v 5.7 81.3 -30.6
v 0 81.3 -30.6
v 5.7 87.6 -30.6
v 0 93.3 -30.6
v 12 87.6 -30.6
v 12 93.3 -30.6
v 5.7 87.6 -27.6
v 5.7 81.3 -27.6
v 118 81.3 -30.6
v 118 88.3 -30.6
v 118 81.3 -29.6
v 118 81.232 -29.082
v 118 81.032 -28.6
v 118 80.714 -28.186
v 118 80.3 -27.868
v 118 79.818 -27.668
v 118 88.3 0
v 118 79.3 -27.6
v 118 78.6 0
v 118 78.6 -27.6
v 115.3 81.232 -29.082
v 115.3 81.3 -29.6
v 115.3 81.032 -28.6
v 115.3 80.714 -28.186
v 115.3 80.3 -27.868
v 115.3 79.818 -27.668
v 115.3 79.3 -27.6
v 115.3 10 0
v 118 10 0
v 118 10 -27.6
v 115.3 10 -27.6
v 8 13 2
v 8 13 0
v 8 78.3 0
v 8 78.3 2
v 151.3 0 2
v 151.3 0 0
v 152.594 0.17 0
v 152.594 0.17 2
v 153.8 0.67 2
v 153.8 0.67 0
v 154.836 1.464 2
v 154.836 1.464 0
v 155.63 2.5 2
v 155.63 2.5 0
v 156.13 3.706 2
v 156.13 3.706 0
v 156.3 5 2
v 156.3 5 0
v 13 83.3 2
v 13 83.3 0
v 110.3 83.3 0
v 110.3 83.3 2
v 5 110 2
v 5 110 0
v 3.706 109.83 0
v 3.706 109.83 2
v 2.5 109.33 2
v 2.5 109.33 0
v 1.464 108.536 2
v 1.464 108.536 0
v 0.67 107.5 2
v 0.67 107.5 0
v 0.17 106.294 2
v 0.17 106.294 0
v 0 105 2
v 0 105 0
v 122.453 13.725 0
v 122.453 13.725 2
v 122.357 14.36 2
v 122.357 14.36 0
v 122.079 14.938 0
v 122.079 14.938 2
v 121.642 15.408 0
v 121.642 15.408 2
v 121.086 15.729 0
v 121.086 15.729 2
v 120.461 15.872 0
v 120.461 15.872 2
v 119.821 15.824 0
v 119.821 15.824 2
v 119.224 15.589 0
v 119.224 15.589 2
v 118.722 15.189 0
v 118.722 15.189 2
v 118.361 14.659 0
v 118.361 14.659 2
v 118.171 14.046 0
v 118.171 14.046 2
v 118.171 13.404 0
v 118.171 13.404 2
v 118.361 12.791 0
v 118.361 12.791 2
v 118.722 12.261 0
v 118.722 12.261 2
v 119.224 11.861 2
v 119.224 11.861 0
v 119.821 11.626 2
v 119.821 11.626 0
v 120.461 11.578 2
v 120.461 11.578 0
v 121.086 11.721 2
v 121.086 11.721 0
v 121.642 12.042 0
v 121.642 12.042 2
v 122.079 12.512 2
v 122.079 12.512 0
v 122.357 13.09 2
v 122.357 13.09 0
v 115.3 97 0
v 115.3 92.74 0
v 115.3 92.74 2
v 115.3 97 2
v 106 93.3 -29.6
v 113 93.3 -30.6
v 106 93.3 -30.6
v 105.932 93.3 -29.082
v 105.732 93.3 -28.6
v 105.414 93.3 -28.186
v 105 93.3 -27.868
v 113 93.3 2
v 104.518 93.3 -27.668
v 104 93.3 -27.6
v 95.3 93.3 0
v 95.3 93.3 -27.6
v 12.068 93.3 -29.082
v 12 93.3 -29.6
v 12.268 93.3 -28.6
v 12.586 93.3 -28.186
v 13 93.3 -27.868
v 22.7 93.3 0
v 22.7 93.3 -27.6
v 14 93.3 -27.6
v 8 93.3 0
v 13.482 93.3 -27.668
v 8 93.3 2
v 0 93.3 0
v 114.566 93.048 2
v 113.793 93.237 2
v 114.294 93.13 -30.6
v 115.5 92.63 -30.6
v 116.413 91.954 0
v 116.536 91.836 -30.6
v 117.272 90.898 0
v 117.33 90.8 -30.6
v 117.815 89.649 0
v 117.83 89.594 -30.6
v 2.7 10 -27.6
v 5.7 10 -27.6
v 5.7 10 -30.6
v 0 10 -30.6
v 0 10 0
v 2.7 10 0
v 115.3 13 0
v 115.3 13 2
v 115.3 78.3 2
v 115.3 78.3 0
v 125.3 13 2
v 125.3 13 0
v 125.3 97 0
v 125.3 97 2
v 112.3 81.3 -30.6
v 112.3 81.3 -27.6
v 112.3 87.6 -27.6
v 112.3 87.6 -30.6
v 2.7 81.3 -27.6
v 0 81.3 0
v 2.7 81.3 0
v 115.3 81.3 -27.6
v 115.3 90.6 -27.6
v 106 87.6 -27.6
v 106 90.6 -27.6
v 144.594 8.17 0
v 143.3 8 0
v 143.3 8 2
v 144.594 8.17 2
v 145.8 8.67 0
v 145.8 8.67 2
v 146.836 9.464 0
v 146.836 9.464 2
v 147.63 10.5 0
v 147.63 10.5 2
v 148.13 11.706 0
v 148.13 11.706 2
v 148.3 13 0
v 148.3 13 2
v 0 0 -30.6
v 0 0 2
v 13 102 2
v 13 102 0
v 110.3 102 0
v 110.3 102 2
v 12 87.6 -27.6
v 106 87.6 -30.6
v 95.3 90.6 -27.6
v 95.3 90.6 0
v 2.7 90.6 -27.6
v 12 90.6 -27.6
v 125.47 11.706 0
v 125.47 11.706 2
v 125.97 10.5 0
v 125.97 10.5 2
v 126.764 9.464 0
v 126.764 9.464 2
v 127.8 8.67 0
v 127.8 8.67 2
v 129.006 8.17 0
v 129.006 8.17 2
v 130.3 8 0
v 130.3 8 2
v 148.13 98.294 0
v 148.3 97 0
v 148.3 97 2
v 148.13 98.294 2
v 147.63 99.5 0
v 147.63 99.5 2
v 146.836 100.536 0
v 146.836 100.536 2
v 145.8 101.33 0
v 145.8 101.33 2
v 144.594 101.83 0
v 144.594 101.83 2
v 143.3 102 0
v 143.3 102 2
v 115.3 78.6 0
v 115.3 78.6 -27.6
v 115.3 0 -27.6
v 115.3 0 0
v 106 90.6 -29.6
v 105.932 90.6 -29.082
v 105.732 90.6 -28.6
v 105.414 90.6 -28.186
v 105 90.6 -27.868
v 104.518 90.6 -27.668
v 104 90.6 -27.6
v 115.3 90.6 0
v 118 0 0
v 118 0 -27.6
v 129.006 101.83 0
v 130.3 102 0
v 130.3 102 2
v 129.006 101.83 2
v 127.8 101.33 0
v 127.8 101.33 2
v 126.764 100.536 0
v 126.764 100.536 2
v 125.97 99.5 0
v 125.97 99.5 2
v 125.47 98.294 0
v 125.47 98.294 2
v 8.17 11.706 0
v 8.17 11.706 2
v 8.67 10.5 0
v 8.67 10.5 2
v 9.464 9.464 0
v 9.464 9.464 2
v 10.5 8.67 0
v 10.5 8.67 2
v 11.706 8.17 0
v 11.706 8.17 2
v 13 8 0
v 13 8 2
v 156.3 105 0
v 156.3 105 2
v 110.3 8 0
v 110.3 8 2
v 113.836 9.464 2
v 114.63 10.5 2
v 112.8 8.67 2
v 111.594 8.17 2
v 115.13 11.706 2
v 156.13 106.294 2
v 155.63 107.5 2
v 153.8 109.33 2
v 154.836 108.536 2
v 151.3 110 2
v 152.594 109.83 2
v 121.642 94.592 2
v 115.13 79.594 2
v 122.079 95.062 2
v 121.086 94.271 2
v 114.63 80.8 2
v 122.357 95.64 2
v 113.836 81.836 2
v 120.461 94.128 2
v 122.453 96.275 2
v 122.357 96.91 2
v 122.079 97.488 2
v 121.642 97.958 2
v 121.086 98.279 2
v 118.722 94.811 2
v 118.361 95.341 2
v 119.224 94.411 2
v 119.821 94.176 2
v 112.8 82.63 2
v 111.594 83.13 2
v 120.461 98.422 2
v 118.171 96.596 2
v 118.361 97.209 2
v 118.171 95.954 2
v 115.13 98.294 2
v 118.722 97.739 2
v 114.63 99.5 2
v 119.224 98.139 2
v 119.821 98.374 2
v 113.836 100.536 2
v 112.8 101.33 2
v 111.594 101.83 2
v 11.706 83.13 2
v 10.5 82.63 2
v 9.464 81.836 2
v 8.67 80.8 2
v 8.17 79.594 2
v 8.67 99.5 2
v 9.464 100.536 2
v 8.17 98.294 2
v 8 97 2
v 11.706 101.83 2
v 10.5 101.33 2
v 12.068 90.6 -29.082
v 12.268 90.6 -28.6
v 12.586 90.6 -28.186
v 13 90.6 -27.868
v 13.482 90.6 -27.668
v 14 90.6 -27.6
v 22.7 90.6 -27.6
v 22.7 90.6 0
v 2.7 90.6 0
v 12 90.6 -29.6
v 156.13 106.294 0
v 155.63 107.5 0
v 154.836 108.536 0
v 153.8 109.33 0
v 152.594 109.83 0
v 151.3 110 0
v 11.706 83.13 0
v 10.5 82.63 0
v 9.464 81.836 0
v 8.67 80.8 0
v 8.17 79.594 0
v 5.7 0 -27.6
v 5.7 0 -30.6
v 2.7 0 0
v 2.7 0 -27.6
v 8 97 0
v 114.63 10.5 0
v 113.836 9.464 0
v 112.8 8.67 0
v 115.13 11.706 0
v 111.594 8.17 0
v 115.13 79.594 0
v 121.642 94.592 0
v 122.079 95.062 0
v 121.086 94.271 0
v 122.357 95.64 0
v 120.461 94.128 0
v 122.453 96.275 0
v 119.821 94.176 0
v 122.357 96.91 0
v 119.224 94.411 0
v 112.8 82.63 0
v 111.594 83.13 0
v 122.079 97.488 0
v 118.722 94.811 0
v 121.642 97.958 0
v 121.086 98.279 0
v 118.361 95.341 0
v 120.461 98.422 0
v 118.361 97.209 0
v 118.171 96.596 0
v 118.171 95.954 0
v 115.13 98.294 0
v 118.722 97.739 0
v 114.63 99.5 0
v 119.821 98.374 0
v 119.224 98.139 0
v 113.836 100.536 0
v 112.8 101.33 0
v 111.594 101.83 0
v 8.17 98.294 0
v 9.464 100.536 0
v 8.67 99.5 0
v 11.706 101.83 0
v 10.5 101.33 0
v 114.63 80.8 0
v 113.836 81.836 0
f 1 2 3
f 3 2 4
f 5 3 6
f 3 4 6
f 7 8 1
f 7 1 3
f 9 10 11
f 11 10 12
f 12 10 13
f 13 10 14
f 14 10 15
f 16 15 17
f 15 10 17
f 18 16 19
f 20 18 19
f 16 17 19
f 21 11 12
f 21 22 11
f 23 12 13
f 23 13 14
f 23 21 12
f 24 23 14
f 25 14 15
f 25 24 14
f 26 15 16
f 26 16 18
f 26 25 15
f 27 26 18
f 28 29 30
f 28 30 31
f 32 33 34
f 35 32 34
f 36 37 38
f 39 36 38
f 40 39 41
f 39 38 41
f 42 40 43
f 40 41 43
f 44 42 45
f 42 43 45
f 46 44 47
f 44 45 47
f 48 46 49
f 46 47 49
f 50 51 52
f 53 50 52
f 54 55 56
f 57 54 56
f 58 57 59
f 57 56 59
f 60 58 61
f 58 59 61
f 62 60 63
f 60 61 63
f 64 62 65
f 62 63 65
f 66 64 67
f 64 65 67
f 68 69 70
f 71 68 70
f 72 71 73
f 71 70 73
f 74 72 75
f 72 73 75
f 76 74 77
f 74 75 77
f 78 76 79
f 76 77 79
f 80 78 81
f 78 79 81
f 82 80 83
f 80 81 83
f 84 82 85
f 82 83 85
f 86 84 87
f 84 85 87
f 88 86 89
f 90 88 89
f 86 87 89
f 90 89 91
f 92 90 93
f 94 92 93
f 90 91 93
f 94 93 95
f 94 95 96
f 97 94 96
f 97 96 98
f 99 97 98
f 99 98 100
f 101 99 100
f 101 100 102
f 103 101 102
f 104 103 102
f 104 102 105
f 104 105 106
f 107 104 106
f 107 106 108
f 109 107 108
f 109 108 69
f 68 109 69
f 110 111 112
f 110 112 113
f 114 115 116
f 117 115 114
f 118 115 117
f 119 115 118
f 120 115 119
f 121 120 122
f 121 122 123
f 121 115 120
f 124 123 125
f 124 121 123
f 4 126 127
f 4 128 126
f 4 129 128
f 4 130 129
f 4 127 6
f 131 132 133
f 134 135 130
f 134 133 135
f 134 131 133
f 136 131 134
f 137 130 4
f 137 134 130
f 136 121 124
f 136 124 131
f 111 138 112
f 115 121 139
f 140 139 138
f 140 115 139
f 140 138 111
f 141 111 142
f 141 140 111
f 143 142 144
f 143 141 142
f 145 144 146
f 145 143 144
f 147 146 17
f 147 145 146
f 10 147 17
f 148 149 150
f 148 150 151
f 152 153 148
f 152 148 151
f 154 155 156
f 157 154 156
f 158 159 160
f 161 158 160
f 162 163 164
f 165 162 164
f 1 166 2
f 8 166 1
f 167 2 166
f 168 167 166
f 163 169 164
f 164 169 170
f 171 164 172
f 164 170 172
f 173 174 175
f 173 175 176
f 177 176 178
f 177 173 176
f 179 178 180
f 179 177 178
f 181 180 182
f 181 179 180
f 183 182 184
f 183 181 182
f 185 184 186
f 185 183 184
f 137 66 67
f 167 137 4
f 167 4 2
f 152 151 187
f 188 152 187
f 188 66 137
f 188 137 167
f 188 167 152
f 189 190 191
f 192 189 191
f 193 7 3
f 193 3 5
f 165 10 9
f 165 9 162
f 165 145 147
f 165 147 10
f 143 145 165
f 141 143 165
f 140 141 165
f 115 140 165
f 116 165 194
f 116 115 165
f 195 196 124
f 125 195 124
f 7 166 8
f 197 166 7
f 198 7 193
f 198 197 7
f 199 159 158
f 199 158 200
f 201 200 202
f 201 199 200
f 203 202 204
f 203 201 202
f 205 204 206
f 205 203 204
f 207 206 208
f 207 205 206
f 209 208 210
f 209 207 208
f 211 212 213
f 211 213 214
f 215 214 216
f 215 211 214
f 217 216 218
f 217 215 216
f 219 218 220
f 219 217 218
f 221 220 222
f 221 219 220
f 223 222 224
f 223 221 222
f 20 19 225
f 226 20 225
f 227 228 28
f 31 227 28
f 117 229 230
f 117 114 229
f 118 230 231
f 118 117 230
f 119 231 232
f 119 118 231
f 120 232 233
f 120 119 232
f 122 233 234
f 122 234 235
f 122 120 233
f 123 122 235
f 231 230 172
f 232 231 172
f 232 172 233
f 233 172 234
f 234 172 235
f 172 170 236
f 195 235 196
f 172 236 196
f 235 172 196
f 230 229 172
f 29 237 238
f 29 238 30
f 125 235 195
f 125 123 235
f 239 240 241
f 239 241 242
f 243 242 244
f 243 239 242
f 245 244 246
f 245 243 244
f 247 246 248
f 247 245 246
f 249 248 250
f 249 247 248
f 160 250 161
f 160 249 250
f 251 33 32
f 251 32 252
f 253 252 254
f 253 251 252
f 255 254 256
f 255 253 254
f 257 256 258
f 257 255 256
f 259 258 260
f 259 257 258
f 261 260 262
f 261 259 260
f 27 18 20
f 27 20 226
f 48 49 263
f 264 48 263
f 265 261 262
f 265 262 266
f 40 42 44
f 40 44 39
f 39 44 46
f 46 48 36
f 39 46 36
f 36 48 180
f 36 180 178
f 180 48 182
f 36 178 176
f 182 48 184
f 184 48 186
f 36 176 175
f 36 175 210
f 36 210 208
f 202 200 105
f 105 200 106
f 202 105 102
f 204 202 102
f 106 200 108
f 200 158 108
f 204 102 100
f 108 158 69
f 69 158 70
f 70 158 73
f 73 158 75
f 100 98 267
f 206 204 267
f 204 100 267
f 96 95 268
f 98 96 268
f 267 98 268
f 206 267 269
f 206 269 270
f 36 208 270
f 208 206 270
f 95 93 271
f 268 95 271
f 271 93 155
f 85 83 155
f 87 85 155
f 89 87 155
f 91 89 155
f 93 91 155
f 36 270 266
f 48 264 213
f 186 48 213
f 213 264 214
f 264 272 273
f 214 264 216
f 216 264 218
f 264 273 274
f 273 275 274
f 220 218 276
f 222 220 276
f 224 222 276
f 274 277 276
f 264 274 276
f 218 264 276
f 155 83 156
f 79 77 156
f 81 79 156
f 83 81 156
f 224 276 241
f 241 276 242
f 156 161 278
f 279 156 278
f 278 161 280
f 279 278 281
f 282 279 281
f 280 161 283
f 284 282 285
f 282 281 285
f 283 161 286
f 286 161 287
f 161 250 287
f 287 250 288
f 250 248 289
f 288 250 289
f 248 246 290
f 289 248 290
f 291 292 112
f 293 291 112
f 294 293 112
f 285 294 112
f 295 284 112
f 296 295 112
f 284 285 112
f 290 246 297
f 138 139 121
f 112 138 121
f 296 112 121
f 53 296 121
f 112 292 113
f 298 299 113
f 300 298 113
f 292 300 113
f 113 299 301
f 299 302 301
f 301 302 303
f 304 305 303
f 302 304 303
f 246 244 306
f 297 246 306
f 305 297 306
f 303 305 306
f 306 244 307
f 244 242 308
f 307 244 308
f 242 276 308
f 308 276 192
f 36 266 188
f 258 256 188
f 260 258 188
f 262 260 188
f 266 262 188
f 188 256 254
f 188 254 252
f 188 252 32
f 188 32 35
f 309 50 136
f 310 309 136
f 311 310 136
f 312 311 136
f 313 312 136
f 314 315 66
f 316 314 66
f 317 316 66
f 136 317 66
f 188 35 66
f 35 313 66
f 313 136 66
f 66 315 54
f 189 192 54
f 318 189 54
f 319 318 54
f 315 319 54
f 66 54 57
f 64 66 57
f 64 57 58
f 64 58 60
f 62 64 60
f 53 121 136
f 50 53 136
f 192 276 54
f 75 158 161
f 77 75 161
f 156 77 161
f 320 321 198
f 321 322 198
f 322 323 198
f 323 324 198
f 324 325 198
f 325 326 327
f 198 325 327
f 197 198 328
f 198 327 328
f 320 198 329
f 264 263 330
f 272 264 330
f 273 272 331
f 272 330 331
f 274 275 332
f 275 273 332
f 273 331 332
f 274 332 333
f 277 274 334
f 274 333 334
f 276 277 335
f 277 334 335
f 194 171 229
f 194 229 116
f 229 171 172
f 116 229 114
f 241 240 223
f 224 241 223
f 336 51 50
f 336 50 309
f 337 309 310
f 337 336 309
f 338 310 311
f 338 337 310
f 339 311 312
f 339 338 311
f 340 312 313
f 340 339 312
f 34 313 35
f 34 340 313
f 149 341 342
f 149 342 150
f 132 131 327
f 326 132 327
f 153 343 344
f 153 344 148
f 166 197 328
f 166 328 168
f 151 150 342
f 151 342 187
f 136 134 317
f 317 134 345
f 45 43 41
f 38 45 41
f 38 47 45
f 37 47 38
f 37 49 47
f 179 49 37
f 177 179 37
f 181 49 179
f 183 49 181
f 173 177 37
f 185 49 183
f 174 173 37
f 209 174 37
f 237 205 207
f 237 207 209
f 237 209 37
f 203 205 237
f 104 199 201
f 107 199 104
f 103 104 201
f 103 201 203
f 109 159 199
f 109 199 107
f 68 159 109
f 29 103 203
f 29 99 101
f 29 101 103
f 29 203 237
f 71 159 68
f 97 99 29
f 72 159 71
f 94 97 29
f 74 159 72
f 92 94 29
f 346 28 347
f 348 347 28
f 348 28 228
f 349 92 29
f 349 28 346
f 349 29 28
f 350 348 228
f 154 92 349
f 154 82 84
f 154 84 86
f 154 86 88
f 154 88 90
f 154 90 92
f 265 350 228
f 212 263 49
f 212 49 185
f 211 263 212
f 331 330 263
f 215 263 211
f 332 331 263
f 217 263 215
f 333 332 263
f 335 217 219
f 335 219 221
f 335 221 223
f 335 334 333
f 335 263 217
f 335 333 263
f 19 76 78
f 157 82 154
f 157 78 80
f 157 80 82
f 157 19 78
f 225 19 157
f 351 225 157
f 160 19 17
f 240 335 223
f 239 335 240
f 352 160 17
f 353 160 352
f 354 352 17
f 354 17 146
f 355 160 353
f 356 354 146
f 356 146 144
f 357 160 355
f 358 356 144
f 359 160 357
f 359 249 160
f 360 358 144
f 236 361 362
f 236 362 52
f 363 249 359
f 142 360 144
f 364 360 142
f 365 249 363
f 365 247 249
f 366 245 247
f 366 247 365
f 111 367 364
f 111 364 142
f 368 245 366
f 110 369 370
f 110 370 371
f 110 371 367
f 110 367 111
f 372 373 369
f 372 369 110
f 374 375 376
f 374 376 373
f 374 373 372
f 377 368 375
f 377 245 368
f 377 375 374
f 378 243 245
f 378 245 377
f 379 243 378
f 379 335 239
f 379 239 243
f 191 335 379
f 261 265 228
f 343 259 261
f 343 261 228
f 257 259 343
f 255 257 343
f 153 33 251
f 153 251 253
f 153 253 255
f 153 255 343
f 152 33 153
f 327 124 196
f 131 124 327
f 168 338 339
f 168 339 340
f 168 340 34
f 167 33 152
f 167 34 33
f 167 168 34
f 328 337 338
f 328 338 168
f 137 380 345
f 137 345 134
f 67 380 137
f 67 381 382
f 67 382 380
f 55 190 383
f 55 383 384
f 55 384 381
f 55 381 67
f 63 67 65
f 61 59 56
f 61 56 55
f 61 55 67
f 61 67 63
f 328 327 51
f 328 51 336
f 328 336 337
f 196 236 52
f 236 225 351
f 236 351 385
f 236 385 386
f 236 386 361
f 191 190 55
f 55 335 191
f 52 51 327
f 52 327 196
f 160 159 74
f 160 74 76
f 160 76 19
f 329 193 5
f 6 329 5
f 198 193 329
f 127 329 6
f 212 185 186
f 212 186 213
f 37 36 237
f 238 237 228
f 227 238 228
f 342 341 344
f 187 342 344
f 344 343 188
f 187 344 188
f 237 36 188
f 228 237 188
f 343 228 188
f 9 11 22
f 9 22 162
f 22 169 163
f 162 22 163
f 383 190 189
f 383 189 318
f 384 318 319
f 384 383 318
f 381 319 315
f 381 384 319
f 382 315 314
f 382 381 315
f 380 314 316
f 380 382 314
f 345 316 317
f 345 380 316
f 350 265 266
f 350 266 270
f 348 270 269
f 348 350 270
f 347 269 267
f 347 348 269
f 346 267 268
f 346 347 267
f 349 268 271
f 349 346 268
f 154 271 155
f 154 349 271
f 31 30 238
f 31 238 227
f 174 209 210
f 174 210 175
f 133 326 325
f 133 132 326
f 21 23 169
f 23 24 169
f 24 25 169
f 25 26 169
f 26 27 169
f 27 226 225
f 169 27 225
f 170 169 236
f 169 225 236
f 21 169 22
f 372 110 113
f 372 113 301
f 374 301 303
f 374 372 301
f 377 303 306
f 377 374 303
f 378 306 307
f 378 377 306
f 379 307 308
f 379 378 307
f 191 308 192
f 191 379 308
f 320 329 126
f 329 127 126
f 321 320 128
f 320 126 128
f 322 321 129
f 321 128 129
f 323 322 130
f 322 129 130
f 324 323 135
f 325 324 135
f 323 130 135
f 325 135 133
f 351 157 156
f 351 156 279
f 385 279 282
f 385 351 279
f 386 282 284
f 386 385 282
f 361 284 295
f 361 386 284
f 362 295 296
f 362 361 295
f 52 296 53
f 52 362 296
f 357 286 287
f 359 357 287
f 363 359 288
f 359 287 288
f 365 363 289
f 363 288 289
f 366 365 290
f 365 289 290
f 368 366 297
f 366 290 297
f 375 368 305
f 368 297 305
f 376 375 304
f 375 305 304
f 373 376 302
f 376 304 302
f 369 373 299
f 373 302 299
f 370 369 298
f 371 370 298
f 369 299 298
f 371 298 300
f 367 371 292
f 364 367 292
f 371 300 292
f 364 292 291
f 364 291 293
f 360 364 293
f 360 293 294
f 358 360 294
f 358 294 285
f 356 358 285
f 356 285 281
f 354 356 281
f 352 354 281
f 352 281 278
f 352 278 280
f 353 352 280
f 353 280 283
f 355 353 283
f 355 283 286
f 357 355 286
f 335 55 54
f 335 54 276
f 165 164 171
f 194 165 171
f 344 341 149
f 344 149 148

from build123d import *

# Parameters (mm, degrees)
SKETCH1_W             = 156.3
SKETCH1_H             = 110
SKETCH1_W_2           = 107.3
SKETCH1_H_2           = 75.3
SKETCH1_H_3           = 8.7
SKETCH1_W_3           = 23
SKETCH1_H_4           = 94
BOSS_EXTRUDE1_DEPTH   = 2
F_6_CLEARANCE_HOLE1_D = 4.3053
SKETCH6_W             = 2.7
SKETCH6_H             = 10
BOSS_EXTRUDE2_DEPTH   = 27.6
SKETCH7_W             = 5.7
SKETCH7_H             = 10
BOSS_EXTRUDE3_DEPTH   = 3
FILLET3_R             = 5
FILLET4_R             = 2
FILLET5_R             = 5


with BuildPart() as part:
    # Sketch1 → Boss-Extrude1 (new body)
    with BuildSketch(Plane.XY):
        with Locations((78.15, 55)):
            Rectangle(SKETCH1_W, SKETCH1_H)
        with Locations((61.65, 45.65)):
            Rectangle(SKETCH1_W_2, SKETCH1_H_2, mode=Mode.SUBTRACT)
        with Locations((61.65, 97.65)):
            Rectangle(SKETCH1_W_2, SKETCH1_H_3, mode=Mode.SUBTRACT)
        with Locations((136.8, 55)):
            Rectangle(SKETCH1_W_3, SKETCH1_H_4, mode=Mode.SUBTRACT)
    extrude(amount=BOSS_EXTRUDE1_DEPTH)

    # #6 Clearance Hole1 (through all)
    with Locations(Plane(origin=(0, 0, 0), x_dir=(-1, 0, 0), z_dir=(0, 0, -1))):
        with Locations((-120.3, 13.725), (-120.3, 96.275)):
            Hole(F_6_CLEARANCE_HOLE1_D / 2)

    # Sketch6 → Boss-Extrude2 (add)
    with BuildSketch(Plane(origin=(0, 0, 0), x_dir=(-1, 0, 0), z_dir=(0, 0, -1))):
        with Locations((-1.35, 5)):
            Rectangle(SKETCH6_W, SKETCH6_H)
        with Locations((-116.65, 5)):
            Rectangle(SKETCH6_W, SKETCH6_H)
        Polygon((0, 81.3), (0, 93.3), (-22.7, 93.3), (-22.7, 90.6), (-2.7, 90.6), (-2.7, 81.3), align=None)
        Polygon((-95.3, 93.3), (-118, 93.3), (-118, 78.6), (-115.3, 78.6), (-115.3, 90.6), (-95.3, 90.6), align=None)
    extrude(amount=BOSS_EXTRUDE2_DEPTH)

    # Sketch7 → Boss-Extrude3 (add)
    with BuildSketch(Plane(origin=(0, 0, -27.6), x_dir=(-1, 0, 0), z_dir=(0, 0, -1))):
        Polygon((0, 93.3), (0, 81.3), (-5.7, 81.3), (-5.7, 87.6), (-12, 87.6), (-12, 93.3), align=None)
        with Locations((-2.85, 5)):
            Rectangle(SKETCH7_W, SKETCH7_H)
        Polygon((-118, 93.3), (-118, 81.3), (-112.3, 81.3), (-112.3, 87.6), (-106, 87.6), (-106, 93.3), align=None)
    extrude(amount=BOSS_EXTRUDE3_DEPTH)

    # Fillet3
    fillet3_edges = [part.edges().sort_by_distance(p)[0] for p in [
        (118, 93.3, -15.3),
    ]]
    fillet(fillet3_edges, radius=FILLET3_R)

    # Fillet4
    fillet4_edges = [part.edges().sort_by_distance(p)[0] for p in [
        (12, 91.95, -27.6),
        (106, 91.95, -27.6),
        (116.65, 81.3, -27.6),
    ]]
    fillet(fillet4_edges, radius=FILLET4_R)

    # Fillet5
    # the kernel refuses this fillet: 5 mm, written as the material it adds along each edge
    with BuildSketch(Plane(origin=(8, 83.3, 0), x_dir=(1, 0, 0), z_dir=(0, 0, 1)), Plane(origin=(115.3, 83.3, 0), x_dir=(0, -1, 0), z_dir=(0, 0, 1)), Plane(origin=(148.3, 102, 0), x_dir=(0, -1, 0), z_dir=(0, 0, 1)), Plane(origin=(148.3, 8, 0), x_dir=(-1, 0, 0), z_dir=(0, 0, 1)), Plane(origin=(8, 102, 0), x_dir=(1, 0, 0), z_dir=(0, 0, 1)), Plane(origin=(115.3, 102, 0), x_dir=(0, -1, 0), z_dir=(0, 0, 1))) as fillet5_piece_1:
        with BuildLine():
            CenterArc((FILLET5_R, -FILLET5_R), FILLET5_R, 90, 90)
            Line((0, -FILLET5_R), (0, 0))
            Line((0, 0), (FILLET5_R, 0))
        make_face()
    extrude(amount=2)
    with BuildSketch(Plane(origin=(8, 8, 0), x_dir=(1, 0, 0), z_dir=(0, 0, 1)), Plane(origin=(115.3, 8, 0), x_dir=(0, 1, 0), z_dir=(0, 0, 1)), Plane(origin=(125.3, 102, 0), x_dir=(0, -1, 0), z_dir=(0, 0, 1)), Plane(origin=(125.3, 8, 0), x_dir=(1, 0, 0), z_dir=(0, 0, 1))) as fillet5_piece_2:
        with BuildLine():
            CenterArc((FILLET5_R, FILLET5_R), FILLET5_R, 180, 90)
            Line((0, FILLET5_R), (0, 0))
            Line((0, 0), (FILLET5_R, 0))
        make_face()
    extrude(amount=2)
    # the kernel refuses this fillet: 5 mm, written as the material it takes off along each edge
    with BuildSketch(Plane(origin=(0, 110, -12.5), x_dir=(1, 0, 0), z_dir=(0, 0, 1))) as fillet5_2_piece_1:
        with BuildLine():
            CenterArc((FILLET5_R, -FILLET5_R), FILLET5_R, 90, 90)
            Line((0, -FILLET5_R), (0, 0))
            Line((0, 0), (FILLET5_R, 0))
        make_face()
    extrude(amount=27, mode=Mode.SUBTRACT)
    with BuildSketch(Plane(origin=(156.3, 110, -12.5), x_dir=(-1, 0, 0), z_dir=(0, 0, 1)), Plane(origin=(156.3, 0, -12.5), x_dir=(0, 1, 0), z_dir=(0, 0, 1))) as fillet5_2_piece_2:
        with BuildLine():
            CenterArc((FILLET5_R, FILLET5_R), FILLET5_R, 180, 90)
            Line((0, FILLET5_R), (0, 0))
            Line((0, 0), (FILLET5_R, 0))
        make_face()
    extrude(amount=27, mode=Mode.SUBTRACT)


solid = part.part
